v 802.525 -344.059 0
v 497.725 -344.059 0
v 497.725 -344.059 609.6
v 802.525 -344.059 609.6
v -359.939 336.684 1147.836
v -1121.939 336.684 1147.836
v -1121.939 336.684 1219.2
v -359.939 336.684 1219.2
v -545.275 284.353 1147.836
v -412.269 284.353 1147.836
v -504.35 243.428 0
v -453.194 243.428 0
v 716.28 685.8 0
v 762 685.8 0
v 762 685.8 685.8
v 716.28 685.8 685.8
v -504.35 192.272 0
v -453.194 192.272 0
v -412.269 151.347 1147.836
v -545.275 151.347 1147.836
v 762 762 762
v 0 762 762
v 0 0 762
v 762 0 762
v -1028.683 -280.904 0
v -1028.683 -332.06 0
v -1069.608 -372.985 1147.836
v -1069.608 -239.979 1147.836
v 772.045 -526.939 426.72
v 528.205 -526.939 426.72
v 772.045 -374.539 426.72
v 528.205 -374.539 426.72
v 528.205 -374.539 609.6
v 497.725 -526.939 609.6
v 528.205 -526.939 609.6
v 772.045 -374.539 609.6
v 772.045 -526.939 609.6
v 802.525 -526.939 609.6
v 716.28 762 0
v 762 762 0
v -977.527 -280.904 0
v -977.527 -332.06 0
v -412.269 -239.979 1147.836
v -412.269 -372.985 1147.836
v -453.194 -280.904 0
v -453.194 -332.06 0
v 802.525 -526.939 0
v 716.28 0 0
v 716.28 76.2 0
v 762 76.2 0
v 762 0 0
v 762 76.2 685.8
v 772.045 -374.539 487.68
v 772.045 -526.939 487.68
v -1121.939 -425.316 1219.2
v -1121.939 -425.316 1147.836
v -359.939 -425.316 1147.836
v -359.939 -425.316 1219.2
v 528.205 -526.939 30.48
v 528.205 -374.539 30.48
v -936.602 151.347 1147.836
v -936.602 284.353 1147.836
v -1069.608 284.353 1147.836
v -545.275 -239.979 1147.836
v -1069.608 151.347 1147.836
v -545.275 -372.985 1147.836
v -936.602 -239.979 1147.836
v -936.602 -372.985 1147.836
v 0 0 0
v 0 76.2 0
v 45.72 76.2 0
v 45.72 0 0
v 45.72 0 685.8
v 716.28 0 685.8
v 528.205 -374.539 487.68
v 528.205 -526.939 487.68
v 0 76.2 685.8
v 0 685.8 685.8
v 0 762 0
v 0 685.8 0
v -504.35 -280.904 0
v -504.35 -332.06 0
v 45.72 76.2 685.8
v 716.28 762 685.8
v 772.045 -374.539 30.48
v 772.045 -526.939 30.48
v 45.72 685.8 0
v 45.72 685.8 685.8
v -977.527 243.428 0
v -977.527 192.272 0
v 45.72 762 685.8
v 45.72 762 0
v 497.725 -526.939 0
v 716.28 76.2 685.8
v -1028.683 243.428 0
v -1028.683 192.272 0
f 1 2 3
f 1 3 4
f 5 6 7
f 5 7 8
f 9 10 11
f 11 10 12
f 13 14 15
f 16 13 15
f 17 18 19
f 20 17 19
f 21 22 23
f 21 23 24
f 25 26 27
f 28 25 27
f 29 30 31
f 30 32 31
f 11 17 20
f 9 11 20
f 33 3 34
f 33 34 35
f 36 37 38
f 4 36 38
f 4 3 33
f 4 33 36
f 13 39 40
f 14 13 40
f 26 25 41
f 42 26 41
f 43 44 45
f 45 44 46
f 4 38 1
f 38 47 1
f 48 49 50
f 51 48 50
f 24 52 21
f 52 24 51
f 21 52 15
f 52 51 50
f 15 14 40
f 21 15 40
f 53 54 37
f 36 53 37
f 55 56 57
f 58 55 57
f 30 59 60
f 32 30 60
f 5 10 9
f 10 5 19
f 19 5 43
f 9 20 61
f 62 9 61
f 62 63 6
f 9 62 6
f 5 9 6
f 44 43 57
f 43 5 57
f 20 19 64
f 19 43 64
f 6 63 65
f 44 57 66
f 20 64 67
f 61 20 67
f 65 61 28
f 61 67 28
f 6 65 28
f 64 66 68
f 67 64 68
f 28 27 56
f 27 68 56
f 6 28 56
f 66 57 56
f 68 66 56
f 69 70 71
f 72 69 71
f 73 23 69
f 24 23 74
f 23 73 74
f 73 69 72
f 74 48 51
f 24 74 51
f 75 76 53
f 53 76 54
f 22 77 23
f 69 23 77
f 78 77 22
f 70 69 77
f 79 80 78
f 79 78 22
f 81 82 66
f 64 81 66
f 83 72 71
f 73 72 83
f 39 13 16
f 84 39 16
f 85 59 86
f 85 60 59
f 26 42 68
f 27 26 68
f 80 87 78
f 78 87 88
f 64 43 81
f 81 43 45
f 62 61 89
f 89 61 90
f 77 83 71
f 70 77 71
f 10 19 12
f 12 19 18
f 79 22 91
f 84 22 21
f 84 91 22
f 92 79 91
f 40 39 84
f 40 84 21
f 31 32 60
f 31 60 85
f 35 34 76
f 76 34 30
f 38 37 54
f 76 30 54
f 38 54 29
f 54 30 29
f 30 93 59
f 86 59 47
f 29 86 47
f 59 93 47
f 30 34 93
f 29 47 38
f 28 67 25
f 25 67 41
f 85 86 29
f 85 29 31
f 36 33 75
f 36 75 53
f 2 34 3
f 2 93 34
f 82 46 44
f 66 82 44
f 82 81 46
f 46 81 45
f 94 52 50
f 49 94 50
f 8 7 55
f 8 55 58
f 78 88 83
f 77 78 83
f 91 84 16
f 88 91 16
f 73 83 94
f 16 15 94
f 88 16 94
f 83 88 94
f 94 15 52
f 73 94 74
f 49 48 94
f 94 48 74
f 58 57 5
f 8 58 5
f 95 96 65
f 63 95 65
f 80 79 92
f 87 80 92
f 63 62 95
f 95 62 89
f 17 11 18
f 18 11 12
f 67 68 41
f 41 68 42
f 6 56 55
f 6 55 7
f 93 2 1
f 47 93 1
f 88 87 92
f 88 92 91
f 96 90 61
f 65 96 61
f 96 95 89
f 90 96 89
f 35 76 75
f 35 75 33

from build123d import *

# Parameters (mm, degrees)
F0_W      = 762
F0_H      = 762
F1_DEPTH  = 762
F2_W      = 670.56
F2_H      = 685.8
F3_DEPTH  = 762.001
F5_DEPTH  = 762.001
F6_W      = 762
F6_H      = 762
F7_DEPTH  = 1219.2
F10_DEPTH = 1187.3168271313
F11_DEPTH = 762.001
F12_W     = 304.8
F12_H     = 182.88
F13_DEPTH = 457.2
F14_T     = -30.48
F15_W     = 304.8
F15_H     = 182.88
F16_DEPTH = 152.4
F17_W     = 243.84
F17_H     = 121.92
F18_DEPTH = 152.4


with BuildPart() as f1:
    # F0 (on Top) → F1 (new body)
    with BuildSketch(Plane.XY):
        with Locations((381, 381)):
            Rectangle(F0_W, F0_H)
    extrude(amount=F1_DEPTH)

    # F2 (on face) → F3 (cut, through all)
    with BuildSketch(Plane.XZ):
        with Locations((381, 342.9)):
            Rectangle(F2_W, F2_H)
    extrude(amount=-F3_DEPTH, mode=Mode.SUBTRACT)

    # F4 (on face) → F5 (cut, through all)
    with BuildSketch(Plane.YZ.offset(762)):
        Polygon((76.2, 685.8), (76.2, 0), (685.8, 0), (685.8000751236, 685.8), align=None)
    extrude(amount=-F5_DEPTH, mode=Mode.SUBTRACT)


with BuildPart() as f7:
    # F6 (on Top) → F7 (new body)
    with BuildSketch(Plane.XY):
        with Locations((-740.938532114, -44.3158271313)):
            Rectangle(F6_W, F6_H)
    extrude(amount=F7_DEPTH)

    # F8 (on face) → F10 (cut, through all)
    with BuildSketch(Plane.XZ.offset(425.3158271313)):
        Polygon((-1069.6078538895, 1147.8358507156), (-1121.938532114, 1147.8358507156), (-1121.938532114, 0), (-1028.6828279495, 0), align=None)
        Polygon((-936.6015791893, 1147.8358507156), (-977.5266051292, 0), (-504.3504590988, 0), (-545.2754850388, 1147.8358507156), (-704.693377018, 1147.8358507156), align=None)
        Polygon((-359.938532114, 0), (-359.938532114, 1147.8358507156), (-412.2692103386, 1147.8358507156), (-453.1942362785, 0), align=None)
    extrude(amount=-F10_DEPTH, mode=Mode.SUBTRACT)

    # F9 (on face) → F11 (cut, through all)
    with BuildSketch(Plane.YZ.offset(-359.938532114)):
        Polygon((-372.9851489067, 1147.8358507156), (-425.3158271313, 1147.8358507156), (-425.3158271313, 0), (-332.0601229668, 0), align=None)
        Polygon((-239.9788742065, 1147.8358507156), (-280.9039001465, 0), (192.2722458839, 0), (151.347219944, 1147.8358507156), (-8.0706720352, 1147.8358507156), align=None)
        Polygon((336.6841728687, 0), (336.6841728687, 1147.8358507156), (284.3534946442, 1147.8358507156), (243.4284687042, 0), align=None)
    extrude(amount=-F11_DEPTH, mode=Mode.SUBTRACT)


with BuildPart() as f13:
    # F12 (on Top) → F13 (new body)
    with BuildSketch(Plane.XY):
        with Locations((650.1248646736, -435.4991536713)):
            Rectangle(F12_W, F12_H)
    extrude(amount=F13_DEPTH)

    # F14
    f14_openings = [f13.faces().sort_by_distance(p)[0] for p in [
        (650.124865, -526.939154, 228.6),
    ]]
    offset(amount=F14_T, openings=f14_openings)

    # F15 (on face) → F16 (join)
    with BuildSketch(Plane.XY.offset(457.2)):
        with Locations((650.1248646736, -435.4991536713)):
            Rectangle(F15_W, F15_H)
    extrude(amount=F16_DEPTH)

    # F17 (on face) → F18 (cut)
    with BuildSketch(Plane.XZ.offset(526.9391536713)):
        with Locations((650.1248646736, 548.64)):
            Rectangle(F17_W, F17_H)
    extrude(amount=-F18_DEPTH, mode=Mode.SUBTRACT)


solid = Compound([f1.part, f7.part, f13.part])
